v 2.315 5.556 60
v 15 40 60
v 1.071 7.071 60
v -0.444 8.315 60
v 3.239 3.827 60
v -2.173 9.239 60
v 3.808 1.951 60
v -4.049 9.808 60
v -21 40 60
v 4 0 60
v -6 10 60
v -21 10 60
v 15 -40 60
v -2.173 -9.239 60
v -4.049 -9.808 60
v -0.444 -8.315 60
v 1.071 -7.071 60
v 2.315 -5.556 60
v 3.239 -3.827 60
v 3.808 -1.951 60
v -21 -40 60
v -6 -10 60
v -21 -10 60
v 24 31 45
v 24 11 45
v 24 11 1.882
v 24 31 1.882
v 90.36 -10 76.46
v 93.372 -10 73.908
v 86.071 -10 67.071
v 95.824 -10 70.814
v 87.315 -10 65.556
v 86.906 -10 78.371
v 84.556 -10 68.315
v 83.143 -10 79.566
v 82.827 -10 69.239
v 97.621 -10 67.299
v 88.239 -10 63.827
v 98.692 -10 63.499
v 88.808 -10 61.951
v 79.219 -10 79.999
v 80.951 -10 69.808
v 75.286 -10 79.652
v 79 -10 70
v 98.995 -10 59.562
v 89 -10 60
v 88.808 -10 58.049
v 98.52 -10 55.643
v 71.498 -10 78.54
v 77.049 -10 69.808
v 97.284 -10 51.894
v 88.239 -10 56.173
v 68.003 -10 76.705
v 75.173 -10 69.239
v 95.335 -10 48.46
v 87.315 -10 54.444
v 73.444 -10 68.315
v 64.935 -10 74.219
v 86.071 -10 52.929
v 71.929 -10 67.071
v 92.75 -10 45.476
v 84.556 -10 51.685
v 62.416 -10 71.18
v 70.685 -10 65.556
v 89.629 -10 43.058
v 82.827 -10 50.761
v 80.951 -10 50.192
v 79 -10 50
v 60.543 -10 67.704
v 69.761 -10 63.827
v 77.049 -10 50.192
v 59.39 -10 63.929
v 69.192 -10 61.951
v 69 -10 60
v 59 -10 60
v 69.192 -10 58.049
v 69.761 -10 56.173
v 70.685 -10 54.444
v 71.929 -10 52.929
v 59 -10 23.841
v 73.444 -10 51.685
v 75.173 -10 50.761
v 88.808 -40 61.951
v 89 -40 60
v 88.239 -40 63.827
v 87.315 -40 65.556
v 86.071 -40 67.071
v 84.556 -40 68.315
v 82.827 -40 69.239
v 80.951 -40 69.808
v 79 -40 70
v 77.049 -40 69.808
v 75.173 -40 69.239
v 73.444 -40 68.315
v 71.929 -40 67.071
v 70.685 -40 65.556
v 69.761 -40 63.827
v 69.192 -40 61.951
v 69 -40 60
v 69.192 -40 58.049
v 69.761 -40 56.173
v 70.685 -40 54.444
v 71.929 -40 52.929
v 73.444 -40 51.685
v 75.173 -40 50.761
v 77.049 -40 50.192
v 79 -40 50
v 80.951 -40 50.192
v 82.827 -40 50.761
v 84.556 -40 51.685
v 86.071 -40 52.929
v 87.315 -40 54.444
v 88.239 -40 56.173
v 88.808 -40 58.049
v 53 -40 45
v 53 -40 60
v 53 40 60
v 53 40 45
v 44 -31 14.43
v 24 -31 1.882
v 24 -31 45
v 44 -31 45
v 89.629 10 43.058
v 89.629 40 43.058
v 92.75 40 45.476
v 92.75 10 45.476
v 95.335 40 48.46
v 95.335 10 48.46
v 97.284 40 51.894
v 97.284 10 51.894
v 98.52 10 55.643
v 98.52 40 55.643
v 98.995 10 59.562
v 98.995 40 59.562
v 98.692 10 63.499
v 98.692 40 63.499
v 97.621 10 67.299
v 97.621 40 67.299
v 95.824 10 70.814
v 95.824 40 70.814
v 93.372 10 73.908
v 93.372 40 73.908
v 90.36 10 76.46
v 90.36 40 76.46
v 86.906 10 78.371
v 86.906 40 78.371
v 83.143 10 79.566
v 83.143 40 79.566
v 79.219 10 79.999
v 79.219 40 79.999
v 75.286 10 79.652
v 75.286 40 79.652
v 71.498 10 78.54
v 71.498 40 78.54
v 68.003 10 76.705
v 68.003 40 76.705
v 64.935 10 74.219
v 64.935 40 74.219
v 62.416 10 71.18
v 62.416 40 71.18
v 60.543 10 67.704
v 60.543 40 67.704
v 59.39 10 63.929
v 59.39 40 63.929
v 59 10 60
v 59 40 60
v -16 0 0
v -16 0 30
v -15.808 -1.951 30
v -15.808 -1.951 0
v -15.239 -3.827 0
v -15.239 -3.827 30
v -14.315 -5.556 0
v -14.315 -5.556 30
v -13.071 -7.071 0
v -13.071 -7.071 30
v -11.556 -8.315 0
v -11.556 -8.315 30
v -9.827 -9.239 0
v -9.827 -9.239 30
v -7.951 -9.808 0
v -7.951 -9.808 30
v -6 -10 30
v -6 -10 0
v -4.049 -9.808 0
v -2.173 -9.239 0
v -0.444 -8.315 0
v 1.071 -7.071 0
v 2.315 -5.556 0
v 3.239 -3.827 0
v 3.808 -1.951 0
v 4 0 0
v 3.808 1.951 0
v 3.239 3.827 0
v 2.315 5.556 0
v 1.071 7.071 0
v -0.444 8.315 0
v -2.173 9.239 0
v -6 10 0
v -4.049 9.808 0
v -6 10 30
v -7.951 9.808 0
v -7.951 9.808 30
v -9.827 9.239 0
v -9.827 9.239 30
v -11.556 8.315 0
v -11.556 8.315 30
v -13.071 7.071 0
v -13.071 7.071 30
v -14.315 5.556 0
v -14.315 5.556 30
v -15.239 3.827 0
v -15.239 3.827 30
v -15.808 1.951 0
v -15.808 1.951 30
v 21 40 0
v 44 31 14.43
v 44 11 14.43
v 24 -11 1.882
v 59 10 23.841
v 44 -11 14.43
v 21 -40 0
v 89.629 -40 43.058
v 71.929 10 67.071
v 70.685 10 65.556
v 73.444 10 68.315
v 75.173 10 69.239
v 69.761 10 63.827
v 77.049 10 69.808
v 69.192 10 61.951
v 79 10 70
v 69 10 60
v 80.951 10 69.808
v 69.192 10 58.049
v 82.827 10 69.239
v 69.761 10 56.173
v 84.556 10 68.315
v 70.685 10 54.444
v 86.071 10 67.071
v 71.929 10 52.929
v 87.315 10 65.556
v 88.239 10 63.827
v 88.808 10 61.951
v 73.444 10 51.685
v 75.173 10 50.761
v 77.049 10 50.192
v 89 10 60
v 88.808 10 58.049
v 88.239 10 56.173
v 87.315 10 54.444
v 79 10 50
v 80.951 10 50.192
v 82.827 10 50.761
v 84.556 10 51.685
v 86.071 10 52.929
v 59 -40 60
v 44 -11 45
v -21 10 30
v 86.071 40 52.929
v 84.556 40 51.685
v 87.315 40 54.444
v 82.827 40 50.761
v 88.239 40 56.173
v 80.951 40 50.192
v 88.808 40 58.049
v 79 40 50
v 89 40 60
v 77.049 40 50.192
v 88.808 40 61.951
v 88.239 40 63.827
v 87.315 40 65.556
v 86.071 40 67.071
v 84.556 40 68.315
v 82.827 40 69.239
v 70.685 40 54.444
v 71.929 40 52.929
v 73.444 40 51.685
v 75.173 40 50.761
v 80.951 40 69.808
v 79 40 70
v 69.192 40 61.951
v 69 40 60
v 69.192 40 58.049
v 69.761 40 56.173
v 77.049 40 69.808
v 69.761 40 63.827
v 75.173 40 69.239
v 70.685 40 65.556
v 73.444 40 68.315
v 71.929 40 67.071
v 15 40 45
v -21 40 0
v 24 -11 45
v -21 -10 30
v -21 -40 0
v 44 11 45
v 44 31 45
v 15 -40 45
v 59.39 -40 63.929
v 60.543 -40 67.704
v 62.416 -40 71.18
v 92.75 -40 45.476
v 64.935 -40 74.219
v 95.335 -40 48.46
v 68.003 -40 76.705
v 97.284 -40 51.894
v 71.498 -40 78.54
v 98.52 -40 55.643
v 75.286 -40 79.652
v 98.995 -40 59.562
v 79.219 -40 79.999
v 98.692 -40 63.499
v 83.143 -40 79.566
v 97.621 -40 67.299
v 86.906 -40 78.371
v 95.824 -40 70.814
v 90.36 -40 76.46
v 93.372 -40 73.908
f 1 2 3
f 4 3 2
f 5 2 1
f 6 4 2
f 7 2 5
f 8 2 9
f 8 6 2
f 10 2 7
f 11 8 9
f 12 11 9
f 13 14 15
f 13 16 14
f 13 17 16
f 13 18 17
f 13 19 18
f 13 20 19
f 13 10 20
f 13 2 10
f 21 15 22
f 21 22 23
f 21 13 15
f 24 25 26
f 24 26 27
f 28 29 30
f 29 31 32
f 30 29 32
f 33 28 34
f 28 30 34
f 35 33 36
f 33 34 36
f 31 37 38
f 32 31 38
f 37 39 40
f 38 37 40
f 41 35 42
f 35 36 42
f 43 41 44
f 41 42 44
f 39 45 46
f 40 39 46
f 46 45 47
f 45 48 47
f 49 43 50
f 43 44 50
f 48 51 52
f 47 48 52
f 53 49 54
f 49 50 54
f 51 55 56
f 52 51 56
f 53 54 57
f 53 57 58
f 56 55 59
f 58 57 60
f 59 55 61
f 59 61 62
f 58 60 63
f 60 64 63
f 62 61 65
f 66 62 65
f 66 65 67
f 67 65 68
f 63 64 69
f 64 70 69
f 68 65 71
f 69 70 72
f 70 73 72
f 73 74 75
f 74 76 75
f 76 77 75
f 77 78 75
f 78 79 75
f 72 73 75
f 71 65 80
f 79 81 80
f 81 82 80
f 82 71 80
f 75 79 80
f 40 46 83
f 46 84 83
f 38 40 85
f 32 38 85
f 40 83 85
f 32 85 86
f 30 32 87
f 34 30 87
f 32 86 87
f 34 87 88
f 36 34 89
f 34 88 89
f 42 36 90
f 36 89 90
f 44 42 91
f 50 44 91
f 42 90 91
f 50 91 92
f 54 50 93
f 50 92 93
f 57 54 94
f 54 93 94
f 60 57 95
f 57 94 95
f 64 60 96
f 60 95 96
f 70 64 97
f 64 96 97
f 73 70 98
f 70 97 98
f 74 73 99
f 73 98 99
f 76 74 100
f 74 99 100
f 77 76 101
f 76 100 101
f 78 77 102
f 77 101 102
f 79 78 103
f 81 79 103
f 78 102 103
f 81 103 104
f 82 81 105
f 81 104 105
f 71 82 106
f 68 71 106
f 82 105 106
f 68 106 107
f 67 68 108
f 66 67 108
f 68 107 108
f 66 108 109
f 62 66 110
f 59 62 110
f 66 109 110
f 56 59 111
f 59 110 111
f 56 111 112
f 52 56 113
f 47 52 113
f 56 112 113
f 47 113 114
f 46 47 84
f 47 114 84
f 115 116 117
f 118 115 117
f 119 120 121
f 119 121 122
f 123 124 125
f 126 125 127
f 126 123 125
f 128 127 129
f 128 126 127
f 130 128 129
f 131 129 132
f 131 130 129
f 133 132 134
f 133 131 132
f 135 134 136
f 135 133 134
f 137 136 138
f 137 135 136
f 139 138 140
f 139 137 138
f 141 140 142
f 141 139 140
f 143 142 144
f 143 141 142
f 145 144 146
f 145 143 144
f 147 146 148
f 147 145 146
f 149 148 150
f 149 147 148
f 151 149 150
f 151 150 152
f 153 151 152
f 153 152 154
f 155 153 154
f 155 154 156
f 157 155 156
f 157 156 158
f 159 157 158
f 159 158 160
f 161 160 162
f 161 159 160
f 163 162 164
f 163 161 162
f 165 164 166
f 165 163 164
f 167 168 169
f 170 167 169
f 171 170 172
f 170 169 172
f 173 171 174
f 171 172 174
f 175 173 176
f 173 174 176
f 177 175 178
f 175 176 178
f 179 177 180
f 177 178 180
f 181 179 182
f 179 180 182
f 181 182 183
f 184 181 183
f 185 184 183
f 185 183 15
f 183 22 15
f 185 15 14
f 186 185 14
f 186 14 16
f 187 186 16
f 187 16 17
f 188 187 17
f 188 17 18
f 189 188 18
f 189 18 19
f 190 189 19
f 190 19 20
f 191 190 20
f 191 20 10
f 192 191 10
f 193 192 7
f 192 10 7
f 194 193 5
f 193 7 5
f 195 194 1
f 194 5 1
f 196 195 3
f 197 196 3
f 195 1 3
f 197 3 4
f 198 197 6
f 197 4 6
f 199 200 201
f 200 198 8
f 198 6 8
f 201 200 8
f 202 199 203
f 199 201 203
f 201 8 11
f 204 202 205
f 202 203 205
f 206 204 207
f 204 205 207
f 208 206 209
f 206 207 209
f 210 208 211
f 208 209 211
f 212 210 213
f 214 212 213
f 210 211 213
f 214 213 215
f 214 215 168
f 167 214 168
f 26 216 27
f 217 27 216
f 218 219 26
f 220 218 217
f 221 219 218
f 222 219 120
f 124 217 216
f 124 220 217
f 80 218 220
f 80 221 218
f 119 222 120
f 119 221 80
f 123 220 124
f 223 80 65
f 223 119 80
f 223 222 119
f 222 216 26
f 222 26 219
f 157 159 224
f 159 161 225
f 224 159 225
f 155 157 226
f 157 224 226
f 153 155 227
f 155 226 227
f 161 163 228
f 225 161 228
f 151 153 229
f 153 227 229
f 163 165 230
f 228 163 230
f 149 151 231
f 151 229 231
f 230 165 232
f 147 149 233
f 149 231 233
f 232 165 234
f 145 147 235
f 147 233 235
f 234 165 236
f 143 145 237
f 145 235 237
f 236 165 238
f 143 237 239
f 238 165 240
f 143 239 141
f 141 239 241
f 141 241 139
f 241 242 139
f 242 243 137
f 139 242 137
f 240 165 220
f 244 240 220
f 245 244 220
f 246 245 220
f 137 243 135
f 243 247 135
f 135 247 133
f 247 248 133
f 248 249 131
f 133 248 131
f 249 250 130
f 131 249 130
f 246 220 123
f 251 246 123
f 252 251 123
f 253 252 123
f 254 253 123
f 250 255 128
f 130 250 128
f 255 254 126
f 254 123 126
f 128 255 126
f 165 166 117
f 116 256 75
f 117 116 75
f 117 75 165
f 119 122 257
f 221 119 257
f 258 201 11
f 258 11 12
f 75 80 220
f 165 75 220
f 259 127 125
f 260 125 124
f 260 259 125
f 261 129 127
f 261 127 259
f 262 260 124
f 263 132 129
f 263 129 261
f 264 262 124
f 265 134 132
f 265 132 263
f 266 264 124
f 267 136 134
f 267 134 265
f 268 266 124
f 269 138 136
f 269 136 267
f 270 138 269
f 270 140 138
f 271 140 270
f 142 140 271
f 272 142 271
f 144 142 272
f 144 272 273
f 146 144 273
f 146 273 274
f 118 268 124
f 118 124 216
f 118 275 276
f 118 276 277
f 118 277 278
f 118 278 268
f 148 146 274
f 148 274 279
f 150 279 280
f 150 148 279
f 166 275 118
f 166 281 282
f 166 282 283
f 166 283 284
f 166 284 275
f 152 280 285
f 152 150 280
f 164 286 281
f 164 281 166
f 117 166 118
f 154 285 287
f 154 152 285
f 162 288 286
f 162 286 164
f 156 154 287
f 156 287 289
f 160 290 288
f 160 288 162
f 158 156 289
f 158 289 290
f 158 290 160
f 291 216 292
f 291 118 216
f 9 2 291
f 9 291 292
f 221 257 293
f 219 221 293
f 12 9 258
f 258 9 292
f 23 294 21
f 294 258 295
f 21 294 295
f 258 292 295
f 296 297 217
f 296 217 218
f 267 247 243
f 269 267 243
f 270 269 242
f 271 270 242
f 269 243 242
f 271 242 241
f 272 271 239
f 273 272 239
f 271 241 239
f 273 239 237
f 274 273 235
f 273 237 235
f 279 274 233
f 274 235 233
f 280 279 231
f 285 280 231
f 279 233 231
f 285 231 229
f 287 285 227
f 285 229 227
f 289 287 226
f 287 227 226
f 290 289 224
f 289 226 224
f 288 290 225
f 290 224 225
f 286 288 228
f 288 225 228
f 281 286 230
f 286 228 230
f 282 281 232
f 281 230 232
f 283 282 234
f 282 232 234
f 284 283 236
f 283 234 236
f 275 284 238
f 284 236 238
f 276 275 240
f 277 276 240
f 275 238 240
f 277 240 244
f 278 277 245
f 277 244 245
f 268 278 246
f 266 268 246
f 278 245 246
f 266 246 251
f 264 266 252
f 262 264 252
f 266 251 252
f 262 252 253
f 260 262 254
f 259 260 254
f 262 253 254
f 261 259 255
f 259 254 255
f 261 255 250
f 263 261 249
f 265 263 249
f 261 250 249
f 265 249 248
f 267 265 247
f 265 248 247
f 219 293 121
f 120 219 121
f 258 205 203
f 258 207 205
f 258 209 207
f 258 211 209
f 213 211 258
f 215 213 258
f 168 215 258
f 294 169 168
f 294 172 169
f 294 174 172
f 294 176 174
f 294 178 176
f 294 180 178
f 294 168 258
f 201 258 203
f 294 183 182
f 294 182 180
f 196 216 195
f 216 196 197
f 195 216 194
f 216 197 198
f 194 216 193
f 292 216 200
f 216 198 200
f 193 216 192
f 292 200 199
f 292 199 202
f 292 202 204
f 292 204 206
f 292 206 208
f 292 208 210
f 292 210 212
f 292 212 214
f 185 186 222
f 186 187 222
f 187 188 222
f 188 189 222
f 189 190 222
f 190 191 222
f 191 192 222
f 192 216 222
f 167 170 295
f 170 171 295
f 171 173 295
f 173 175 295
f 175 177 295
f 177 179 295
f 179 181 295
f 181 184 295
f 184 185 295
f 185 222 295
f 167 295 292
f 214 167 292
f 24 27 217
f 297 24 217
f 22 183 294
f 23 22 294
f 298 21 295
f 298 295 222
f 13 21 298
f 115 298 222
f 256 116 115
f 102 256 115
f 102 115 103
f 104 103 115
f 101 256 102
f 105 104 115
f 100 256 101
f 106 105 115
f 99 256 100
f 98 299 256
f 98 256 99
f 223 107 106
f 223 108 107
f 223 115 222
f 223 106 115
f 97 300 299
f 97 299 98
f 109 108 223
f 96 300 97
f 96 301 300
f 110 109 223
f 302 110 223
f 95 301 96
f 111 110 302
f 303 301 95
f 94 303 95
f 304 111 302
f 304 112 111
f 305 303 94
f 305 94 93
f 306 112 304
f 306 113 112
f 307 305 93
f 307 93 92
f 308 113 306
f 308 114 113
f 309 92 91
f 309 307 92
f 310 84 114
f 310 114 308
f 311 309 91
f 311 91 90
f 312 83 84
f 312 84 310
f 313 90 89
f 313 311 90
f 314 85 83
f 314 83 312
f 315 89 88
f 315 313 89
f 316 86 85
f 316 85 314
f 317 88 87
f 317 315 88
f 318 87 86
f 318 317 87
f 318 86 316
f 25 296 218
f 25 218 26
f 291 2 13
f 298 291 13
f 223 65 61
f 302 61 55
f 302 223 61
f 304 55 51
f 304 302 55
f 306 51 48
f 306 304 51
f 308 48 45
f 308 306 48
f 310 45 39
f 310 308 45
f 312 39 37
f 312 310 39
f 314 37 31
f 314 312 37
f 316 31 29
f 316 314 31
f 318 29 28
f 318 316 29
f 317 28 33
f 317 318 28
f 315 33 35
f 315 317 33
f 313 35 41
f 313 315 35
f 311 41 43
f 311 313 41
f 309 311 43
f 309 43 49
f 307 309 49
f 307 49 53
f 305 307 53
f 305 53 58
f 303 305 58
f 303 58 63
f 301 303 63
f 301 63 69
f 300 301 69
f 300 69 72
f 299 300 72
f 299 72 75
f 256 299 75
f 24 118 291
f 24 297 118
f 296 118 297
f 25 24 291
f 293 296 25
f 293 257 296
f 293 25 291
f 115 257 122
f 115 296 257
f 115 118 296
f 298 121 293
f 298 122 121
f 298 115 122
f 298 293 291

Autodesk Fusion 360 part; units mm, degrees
sketch "Sketch1" plane through (0, 0, 0) normal (0, 0, 1) x (1, 0, 0)
  line L0 (0, 0) -> (21, 0)
  line L1 (21, 0) -> (0, 0)
  line L2 (0, 0) -> (-21, 0)
  line L3 (-21, 0) -> (-21, -40)
  line L4 (21, 0) -> (21, 40)
  line L5 (21, 40) -> (-21, 40)
  line L6 (-21, 40) -> (-21, -40)
  line L7 (-21, -40) -> (21, -40)
  line L8 (21, -40) -> (21, 40)
  dimension "d1" = 21
  dimension "d2" = 21
  dimension "d3" = 40
  dimension "d4" = 40
extrude "Extrude1" add sketch "Sketch1" along normal blind 60 makes body 1
sketch "Sketch2" plane through (0, -40, 0) normal (0, -1, 0) x (1, 0, 0)
  line L0 (-21, 0) -> (21, 0)
  line L1 (21, 0) -> (21, 60)
  line L2 (21, 60) -> (-21, 60)
  line L3 (-21, 60) -> (-21, 0)
  line L4 (-21, 60) -> (99, 60)
  line L5 (21, 0) -> (99, 60)
  dimension "d7" = 120
extrude "Extrude2" add sketch "Sketch2" against normal blind 80 contours L1 L4 L5 bodies 1
sketch "Sketch3" plane through (0, 40, 0) normal (0, 1, 0) x (-1, 0, 0)
  line L0 (-21, 0) -> (21, 0)
  line L1 (21, 0) -> (21, 60)
sketch "Sketch4" plane through (0, 0, 60) normal (0, 0, 1) x (-1, 0, 0)
  line L0 (-99, -40) -> (21, -40)
  line L1 (21, -40) -> (21, 40)
  line L2 (21, 40) -> (-99, 40)
  line L3 (-99, 40) -> (-99, -40)
  line L4 (-79, 40) -> (6, 40)
  circle A0 centre (6, 0) radius 10
  point P0 (21, 0)
  point P1 (6, 0)
  dimension "d13" = 85
  dimension "d14" = 20
extrude "Extrude3" cut sketch "Sketch4" against normal blind 234 contours A0 bodies 1
sketch "Sketch5" plane through (0, 0, 60) normal (0, 0, 1) x (-1, 0, 0)
  circle A0 centre (6, 0) radius 10
  line L0 (-99, -40) -> (21, -40)
  line L1 (21, -40) -> (21, 40)
  line L2 (21, 40) -> (-99, 40)
  line L3 (-99, 40) -> (-99, -40)
  circle A1 centre (6, 0) radius 10
  line L4 (6, -10) -> (6, 10)
  line L5 (6, -10) -> (21, -10)
  line L6 (6, 10) -> (21, 10)
extrude "Extrude4" cut sketch "Sketch5" against normal blind 30 contours A0 L1 A1 L5 L6 bodies 1
sketch "Sketch6" plane through (0, 0, 60) normal (0, 0, 1) x (-1, 0, 0)
  line L0 (21, -10) -> (6, -10)
  arc A0 (6, 10) -> (6, -10) centre (6, 0) ccw
  line L1 (6, 10) -> (21, 10)
  line L2 (21, 10) -> (21, 40)
  line L3 (21, 40) -> (-99, 40)
  line L4 (-99, 40) -> (-99, -40)
  line L5 (-99, -40) -> (21, -40)
  line L6 (21, -40) -> (21, -10)
  line L7 (21, 40) -> (-79, 40)
  line L8 (-79, 40) -> (-34, 40)
  line L9 (-99, 0) -> (-99, 21)
  line L10 (-99, 0) -> (-99, -21)
  line L11 (-24, -31) -> (-44, -31)
  line L12 (-44, -31) -> (-44, -11)
  line L13 (-44, -11) -> (-24, -11)
  line L14 (-24, -11) -> (-24, -31)
  line L15 (-24, -31) -> (-44, -11) construction
  line L16 (-44, -31) -> (-24, -11) construction
  line L17 (-44, 11) -> (-24, 11)
  line L18 (-24, 11) -> (-24, 31)
  line L19 (-24, 31) -> (-44, 31)
  line L20 (-44, 31) -> (-44, 11)
  line L21 (-44, 11) -> (-24, 31) construction
  line L22 (-24, 11) -> (-44, 31) construction
  point P0 (-99, 0)
  point P1 (-34, 21)
  point P2 (-34, -21)
  point P3 (-34, -21)
  point P4 (-34, 21)
  dimension "d23" = 20
  dimension "d24" = 20
  dimension "d25" = 20
  dimension "d26" = 20
sketch "Sketch9" plane through (0, 0, 60) normal (0, 0, 1) x (-1, 0, 0)
  line L0 (21, -10) -> (6, -10)
  arc A0 (6, 10) -> (6, -10) centre (6, 0) ccw
  line L1 (6, 10) -> (21, 10)
  line L2 (21, 10) -> (21, 40)
  line L3 (21, 40) -> (-99, 40)
  line L4 (-99, 40) -> (-99, -40)
  line L5 (-99, -40) -> (21, -40)
  line L6 (21, -40) -> (21, -10)
  line L7 (-99, 40) -> (-135, 40)
  line L8 (-135, 40) -> (-135, -40)
  line L9 (-135, -40) -> (-99, -40)
  line L10 (-99, -40) -> (-99, 40)
extrude "Extrude7" add sketch "Sketch9" against normal blind 60 separate body contours L4 L7 L8 L9 L10 makes body 2
extrude "Extrude8" add 1 faces at (99, -13.3333, 40) along direction (-1, 0, 0) blind 85 on bodies 2 bodies 2 1
extrude "Extrude5" cut sketch "Sketch6" against normal blind 75 contours L11 L12 L13 L14 | L17 L18 L19 L20 bodies 2
sketch "Sketch7" plane through (0, 0, 60) normal (0, 0, 1) x (-1, 0, 0)
  line L0 (-44, -31) -> (-44, -11)
  line L1 (-44, -11) -> (-24, -11)
  line L2 (-24, -11) -> (-24, -31)
  line L3 (-24, -31) -> (-44, -31)
  line L4 (-24, 11) -> (-44, 11)
  line L5 (-44, 11) -> (-44, 31)
  line L6 (-44, 31) -> (-24, 31)
  line L7 (-24, 31) -> (-24, 11)
  line L8 (21, -10) -> (6, -10)
  arc A0 (6, 10) -> (6, -10) centre (6, 0) ccw
  line L9 (6, 10) -> (21, 10)
  line L10 (21, 10) -> (21, 40)
  line L11 (21, 40) -> (-135, 40)
  line L12 (-135, -40) -> (21, -40)
  line L13 (21, -40) -> (21, -10)
  line L14 (-79, 40) -> (-34, 40)
  line L15 (-34, 40) -> (-53, 40)
  line L16 (-34, 40) -> (-15, 40)
  line L17 (-15, 40) -> (-53, 40)
  line L18 (-53, 40) -> (-53, -40)
  line L19 (-53, -40) -> (-15, -40)
  line L20 (-15, -40) -> (-15, 40)
  line L21 (-135, 40) -> (-135, -40)
  dimension "d30" = 45
extrude "Extrude6" cut sketch "Sketch7" against normal blind 15 contours L11 L12 L14 L15 L16 L17 L18 L19 L20 bodies 2
sketch "Sketch10" plane through (0, -40, 0) normal (0, -1, 0) x (1, 0, 0)
  line L0 (15, 45) -> (15, 60)
  line L1 (15, 60) -> (-21, 60)
  line L2 (-21, 60) -> (-21, 0)
  line L3 (-21, 0) -> (135, 0)
  line L4 (135, 0) -> (135, 60)
  line L5 (135, 60) -> (53, 60)
  line L6 (53, 60) -> (53, 45)
  line L7 (53, 45) -> (15, 45)
  circle A0 centre (79, 60) radius 20
  line L8 (-21, 0) -> (21, 0)
  line L9 (21, 0) -> (89.6293, 43.0584)
  dimension "d40" = 40
  dimension "d41" = 42
extrude "Extrude9" cut sketch "Sketch10" against normal blind 165 contours L3 L4 L5 A0 L9 bodies 2
sketch "Sketch11" plane through (0, -40, 0) normal (0, -1, 0) x (1, 0, 0)
  line L0 (21, 0) -> (89.6293, 43.0584)
  arc A0 (89.6293, 43.0584) -> (99, 60) centre (79, 60) ccw
  line L1 (99, 60) -> (53, 60)
  line L2 (53, 60) -> (53, 45)
  line L3 (53, 45) -> (15, 45)
  line L4 (15, 45) -> (15, 60)
  line L5 (15, 60) -> (-21, 60)
  line L6 (-21, 60) -> (-21, 0)
  line L7 (-21, 0) -> (21, 0)
  circle A1 centre (79, 60) radius 20
  dimension "d45" = 40
extrude "Extrude10" add sketch "Sketch11" against normal blind 80 contours A0 L1 A1 | L1 A1 bodies 2
sketch "Sketch12" plane through (0, -40, 0) normal (0, -1, 0) x (1, 0, 0)
  line L0 (59, 60) -> (53, 60)
  line L1 (53, 60) -> (53, 45)
  line L2 (53, 45) -> (15, 45)
  line L3 (15, 45) -> (15, 60)
  line L4 (15, 60) -> (-21, 60)
  line L5 (-21, 60) -> (-21, 0)
  line L6 (-21, 0) -> (21, 0)
  line L7 (21, 0) -> (89.6293, 43.0584)
  arc A0 (89.6293, 43.0584) -> (59, 60) centre (79, 60) ccw
  circle A1 centre (79, 60) radius 10
  dimension "d48" = 20
extrude "Extrude11" cut sketch "Sketch12" against normal blind 180 contours A1 bodies 2
sketch "Sketch13" plane through (0, 0, 60) normal (0, 0, 1) x (-1, 0, 0)
  line L0 (-15, 40) -> (-15, -40)
  line L1 (-15, -40) -> (21, -40)
  line L2 (21, -40) -> (21, -10)
  line L3 (21, -10) -> (6, -10)
  arc A0 (6, 10) -> (6, -10) centre (6, 0) ccw
  line L4 (6, 10) -> (21, 10)
  line L5 (21, 10) -> (21, 40)
  line L6 (21, 40) -> (-15, 40)
  line L7 (-59, 0) -> (-59, -10)
  line L8 (-59, 0) -> (-59, 10)
  line L9 (-59, -10) -> (-105, -10)
  line L10 (-105, -10) -> (-105, 10)
  line L11 (-105, 10) -> (-59, 10)
  line L12 (-59, 10) -> (-59, -10)
  dimension "d52" = 10
  dimension "d53" = 10
extrude "Extrude12" cut sketch "Sketch13" along normal blind 50 and the other way blind 60 contours L7 L8 L9 L10 L11 L12 bodies 2
